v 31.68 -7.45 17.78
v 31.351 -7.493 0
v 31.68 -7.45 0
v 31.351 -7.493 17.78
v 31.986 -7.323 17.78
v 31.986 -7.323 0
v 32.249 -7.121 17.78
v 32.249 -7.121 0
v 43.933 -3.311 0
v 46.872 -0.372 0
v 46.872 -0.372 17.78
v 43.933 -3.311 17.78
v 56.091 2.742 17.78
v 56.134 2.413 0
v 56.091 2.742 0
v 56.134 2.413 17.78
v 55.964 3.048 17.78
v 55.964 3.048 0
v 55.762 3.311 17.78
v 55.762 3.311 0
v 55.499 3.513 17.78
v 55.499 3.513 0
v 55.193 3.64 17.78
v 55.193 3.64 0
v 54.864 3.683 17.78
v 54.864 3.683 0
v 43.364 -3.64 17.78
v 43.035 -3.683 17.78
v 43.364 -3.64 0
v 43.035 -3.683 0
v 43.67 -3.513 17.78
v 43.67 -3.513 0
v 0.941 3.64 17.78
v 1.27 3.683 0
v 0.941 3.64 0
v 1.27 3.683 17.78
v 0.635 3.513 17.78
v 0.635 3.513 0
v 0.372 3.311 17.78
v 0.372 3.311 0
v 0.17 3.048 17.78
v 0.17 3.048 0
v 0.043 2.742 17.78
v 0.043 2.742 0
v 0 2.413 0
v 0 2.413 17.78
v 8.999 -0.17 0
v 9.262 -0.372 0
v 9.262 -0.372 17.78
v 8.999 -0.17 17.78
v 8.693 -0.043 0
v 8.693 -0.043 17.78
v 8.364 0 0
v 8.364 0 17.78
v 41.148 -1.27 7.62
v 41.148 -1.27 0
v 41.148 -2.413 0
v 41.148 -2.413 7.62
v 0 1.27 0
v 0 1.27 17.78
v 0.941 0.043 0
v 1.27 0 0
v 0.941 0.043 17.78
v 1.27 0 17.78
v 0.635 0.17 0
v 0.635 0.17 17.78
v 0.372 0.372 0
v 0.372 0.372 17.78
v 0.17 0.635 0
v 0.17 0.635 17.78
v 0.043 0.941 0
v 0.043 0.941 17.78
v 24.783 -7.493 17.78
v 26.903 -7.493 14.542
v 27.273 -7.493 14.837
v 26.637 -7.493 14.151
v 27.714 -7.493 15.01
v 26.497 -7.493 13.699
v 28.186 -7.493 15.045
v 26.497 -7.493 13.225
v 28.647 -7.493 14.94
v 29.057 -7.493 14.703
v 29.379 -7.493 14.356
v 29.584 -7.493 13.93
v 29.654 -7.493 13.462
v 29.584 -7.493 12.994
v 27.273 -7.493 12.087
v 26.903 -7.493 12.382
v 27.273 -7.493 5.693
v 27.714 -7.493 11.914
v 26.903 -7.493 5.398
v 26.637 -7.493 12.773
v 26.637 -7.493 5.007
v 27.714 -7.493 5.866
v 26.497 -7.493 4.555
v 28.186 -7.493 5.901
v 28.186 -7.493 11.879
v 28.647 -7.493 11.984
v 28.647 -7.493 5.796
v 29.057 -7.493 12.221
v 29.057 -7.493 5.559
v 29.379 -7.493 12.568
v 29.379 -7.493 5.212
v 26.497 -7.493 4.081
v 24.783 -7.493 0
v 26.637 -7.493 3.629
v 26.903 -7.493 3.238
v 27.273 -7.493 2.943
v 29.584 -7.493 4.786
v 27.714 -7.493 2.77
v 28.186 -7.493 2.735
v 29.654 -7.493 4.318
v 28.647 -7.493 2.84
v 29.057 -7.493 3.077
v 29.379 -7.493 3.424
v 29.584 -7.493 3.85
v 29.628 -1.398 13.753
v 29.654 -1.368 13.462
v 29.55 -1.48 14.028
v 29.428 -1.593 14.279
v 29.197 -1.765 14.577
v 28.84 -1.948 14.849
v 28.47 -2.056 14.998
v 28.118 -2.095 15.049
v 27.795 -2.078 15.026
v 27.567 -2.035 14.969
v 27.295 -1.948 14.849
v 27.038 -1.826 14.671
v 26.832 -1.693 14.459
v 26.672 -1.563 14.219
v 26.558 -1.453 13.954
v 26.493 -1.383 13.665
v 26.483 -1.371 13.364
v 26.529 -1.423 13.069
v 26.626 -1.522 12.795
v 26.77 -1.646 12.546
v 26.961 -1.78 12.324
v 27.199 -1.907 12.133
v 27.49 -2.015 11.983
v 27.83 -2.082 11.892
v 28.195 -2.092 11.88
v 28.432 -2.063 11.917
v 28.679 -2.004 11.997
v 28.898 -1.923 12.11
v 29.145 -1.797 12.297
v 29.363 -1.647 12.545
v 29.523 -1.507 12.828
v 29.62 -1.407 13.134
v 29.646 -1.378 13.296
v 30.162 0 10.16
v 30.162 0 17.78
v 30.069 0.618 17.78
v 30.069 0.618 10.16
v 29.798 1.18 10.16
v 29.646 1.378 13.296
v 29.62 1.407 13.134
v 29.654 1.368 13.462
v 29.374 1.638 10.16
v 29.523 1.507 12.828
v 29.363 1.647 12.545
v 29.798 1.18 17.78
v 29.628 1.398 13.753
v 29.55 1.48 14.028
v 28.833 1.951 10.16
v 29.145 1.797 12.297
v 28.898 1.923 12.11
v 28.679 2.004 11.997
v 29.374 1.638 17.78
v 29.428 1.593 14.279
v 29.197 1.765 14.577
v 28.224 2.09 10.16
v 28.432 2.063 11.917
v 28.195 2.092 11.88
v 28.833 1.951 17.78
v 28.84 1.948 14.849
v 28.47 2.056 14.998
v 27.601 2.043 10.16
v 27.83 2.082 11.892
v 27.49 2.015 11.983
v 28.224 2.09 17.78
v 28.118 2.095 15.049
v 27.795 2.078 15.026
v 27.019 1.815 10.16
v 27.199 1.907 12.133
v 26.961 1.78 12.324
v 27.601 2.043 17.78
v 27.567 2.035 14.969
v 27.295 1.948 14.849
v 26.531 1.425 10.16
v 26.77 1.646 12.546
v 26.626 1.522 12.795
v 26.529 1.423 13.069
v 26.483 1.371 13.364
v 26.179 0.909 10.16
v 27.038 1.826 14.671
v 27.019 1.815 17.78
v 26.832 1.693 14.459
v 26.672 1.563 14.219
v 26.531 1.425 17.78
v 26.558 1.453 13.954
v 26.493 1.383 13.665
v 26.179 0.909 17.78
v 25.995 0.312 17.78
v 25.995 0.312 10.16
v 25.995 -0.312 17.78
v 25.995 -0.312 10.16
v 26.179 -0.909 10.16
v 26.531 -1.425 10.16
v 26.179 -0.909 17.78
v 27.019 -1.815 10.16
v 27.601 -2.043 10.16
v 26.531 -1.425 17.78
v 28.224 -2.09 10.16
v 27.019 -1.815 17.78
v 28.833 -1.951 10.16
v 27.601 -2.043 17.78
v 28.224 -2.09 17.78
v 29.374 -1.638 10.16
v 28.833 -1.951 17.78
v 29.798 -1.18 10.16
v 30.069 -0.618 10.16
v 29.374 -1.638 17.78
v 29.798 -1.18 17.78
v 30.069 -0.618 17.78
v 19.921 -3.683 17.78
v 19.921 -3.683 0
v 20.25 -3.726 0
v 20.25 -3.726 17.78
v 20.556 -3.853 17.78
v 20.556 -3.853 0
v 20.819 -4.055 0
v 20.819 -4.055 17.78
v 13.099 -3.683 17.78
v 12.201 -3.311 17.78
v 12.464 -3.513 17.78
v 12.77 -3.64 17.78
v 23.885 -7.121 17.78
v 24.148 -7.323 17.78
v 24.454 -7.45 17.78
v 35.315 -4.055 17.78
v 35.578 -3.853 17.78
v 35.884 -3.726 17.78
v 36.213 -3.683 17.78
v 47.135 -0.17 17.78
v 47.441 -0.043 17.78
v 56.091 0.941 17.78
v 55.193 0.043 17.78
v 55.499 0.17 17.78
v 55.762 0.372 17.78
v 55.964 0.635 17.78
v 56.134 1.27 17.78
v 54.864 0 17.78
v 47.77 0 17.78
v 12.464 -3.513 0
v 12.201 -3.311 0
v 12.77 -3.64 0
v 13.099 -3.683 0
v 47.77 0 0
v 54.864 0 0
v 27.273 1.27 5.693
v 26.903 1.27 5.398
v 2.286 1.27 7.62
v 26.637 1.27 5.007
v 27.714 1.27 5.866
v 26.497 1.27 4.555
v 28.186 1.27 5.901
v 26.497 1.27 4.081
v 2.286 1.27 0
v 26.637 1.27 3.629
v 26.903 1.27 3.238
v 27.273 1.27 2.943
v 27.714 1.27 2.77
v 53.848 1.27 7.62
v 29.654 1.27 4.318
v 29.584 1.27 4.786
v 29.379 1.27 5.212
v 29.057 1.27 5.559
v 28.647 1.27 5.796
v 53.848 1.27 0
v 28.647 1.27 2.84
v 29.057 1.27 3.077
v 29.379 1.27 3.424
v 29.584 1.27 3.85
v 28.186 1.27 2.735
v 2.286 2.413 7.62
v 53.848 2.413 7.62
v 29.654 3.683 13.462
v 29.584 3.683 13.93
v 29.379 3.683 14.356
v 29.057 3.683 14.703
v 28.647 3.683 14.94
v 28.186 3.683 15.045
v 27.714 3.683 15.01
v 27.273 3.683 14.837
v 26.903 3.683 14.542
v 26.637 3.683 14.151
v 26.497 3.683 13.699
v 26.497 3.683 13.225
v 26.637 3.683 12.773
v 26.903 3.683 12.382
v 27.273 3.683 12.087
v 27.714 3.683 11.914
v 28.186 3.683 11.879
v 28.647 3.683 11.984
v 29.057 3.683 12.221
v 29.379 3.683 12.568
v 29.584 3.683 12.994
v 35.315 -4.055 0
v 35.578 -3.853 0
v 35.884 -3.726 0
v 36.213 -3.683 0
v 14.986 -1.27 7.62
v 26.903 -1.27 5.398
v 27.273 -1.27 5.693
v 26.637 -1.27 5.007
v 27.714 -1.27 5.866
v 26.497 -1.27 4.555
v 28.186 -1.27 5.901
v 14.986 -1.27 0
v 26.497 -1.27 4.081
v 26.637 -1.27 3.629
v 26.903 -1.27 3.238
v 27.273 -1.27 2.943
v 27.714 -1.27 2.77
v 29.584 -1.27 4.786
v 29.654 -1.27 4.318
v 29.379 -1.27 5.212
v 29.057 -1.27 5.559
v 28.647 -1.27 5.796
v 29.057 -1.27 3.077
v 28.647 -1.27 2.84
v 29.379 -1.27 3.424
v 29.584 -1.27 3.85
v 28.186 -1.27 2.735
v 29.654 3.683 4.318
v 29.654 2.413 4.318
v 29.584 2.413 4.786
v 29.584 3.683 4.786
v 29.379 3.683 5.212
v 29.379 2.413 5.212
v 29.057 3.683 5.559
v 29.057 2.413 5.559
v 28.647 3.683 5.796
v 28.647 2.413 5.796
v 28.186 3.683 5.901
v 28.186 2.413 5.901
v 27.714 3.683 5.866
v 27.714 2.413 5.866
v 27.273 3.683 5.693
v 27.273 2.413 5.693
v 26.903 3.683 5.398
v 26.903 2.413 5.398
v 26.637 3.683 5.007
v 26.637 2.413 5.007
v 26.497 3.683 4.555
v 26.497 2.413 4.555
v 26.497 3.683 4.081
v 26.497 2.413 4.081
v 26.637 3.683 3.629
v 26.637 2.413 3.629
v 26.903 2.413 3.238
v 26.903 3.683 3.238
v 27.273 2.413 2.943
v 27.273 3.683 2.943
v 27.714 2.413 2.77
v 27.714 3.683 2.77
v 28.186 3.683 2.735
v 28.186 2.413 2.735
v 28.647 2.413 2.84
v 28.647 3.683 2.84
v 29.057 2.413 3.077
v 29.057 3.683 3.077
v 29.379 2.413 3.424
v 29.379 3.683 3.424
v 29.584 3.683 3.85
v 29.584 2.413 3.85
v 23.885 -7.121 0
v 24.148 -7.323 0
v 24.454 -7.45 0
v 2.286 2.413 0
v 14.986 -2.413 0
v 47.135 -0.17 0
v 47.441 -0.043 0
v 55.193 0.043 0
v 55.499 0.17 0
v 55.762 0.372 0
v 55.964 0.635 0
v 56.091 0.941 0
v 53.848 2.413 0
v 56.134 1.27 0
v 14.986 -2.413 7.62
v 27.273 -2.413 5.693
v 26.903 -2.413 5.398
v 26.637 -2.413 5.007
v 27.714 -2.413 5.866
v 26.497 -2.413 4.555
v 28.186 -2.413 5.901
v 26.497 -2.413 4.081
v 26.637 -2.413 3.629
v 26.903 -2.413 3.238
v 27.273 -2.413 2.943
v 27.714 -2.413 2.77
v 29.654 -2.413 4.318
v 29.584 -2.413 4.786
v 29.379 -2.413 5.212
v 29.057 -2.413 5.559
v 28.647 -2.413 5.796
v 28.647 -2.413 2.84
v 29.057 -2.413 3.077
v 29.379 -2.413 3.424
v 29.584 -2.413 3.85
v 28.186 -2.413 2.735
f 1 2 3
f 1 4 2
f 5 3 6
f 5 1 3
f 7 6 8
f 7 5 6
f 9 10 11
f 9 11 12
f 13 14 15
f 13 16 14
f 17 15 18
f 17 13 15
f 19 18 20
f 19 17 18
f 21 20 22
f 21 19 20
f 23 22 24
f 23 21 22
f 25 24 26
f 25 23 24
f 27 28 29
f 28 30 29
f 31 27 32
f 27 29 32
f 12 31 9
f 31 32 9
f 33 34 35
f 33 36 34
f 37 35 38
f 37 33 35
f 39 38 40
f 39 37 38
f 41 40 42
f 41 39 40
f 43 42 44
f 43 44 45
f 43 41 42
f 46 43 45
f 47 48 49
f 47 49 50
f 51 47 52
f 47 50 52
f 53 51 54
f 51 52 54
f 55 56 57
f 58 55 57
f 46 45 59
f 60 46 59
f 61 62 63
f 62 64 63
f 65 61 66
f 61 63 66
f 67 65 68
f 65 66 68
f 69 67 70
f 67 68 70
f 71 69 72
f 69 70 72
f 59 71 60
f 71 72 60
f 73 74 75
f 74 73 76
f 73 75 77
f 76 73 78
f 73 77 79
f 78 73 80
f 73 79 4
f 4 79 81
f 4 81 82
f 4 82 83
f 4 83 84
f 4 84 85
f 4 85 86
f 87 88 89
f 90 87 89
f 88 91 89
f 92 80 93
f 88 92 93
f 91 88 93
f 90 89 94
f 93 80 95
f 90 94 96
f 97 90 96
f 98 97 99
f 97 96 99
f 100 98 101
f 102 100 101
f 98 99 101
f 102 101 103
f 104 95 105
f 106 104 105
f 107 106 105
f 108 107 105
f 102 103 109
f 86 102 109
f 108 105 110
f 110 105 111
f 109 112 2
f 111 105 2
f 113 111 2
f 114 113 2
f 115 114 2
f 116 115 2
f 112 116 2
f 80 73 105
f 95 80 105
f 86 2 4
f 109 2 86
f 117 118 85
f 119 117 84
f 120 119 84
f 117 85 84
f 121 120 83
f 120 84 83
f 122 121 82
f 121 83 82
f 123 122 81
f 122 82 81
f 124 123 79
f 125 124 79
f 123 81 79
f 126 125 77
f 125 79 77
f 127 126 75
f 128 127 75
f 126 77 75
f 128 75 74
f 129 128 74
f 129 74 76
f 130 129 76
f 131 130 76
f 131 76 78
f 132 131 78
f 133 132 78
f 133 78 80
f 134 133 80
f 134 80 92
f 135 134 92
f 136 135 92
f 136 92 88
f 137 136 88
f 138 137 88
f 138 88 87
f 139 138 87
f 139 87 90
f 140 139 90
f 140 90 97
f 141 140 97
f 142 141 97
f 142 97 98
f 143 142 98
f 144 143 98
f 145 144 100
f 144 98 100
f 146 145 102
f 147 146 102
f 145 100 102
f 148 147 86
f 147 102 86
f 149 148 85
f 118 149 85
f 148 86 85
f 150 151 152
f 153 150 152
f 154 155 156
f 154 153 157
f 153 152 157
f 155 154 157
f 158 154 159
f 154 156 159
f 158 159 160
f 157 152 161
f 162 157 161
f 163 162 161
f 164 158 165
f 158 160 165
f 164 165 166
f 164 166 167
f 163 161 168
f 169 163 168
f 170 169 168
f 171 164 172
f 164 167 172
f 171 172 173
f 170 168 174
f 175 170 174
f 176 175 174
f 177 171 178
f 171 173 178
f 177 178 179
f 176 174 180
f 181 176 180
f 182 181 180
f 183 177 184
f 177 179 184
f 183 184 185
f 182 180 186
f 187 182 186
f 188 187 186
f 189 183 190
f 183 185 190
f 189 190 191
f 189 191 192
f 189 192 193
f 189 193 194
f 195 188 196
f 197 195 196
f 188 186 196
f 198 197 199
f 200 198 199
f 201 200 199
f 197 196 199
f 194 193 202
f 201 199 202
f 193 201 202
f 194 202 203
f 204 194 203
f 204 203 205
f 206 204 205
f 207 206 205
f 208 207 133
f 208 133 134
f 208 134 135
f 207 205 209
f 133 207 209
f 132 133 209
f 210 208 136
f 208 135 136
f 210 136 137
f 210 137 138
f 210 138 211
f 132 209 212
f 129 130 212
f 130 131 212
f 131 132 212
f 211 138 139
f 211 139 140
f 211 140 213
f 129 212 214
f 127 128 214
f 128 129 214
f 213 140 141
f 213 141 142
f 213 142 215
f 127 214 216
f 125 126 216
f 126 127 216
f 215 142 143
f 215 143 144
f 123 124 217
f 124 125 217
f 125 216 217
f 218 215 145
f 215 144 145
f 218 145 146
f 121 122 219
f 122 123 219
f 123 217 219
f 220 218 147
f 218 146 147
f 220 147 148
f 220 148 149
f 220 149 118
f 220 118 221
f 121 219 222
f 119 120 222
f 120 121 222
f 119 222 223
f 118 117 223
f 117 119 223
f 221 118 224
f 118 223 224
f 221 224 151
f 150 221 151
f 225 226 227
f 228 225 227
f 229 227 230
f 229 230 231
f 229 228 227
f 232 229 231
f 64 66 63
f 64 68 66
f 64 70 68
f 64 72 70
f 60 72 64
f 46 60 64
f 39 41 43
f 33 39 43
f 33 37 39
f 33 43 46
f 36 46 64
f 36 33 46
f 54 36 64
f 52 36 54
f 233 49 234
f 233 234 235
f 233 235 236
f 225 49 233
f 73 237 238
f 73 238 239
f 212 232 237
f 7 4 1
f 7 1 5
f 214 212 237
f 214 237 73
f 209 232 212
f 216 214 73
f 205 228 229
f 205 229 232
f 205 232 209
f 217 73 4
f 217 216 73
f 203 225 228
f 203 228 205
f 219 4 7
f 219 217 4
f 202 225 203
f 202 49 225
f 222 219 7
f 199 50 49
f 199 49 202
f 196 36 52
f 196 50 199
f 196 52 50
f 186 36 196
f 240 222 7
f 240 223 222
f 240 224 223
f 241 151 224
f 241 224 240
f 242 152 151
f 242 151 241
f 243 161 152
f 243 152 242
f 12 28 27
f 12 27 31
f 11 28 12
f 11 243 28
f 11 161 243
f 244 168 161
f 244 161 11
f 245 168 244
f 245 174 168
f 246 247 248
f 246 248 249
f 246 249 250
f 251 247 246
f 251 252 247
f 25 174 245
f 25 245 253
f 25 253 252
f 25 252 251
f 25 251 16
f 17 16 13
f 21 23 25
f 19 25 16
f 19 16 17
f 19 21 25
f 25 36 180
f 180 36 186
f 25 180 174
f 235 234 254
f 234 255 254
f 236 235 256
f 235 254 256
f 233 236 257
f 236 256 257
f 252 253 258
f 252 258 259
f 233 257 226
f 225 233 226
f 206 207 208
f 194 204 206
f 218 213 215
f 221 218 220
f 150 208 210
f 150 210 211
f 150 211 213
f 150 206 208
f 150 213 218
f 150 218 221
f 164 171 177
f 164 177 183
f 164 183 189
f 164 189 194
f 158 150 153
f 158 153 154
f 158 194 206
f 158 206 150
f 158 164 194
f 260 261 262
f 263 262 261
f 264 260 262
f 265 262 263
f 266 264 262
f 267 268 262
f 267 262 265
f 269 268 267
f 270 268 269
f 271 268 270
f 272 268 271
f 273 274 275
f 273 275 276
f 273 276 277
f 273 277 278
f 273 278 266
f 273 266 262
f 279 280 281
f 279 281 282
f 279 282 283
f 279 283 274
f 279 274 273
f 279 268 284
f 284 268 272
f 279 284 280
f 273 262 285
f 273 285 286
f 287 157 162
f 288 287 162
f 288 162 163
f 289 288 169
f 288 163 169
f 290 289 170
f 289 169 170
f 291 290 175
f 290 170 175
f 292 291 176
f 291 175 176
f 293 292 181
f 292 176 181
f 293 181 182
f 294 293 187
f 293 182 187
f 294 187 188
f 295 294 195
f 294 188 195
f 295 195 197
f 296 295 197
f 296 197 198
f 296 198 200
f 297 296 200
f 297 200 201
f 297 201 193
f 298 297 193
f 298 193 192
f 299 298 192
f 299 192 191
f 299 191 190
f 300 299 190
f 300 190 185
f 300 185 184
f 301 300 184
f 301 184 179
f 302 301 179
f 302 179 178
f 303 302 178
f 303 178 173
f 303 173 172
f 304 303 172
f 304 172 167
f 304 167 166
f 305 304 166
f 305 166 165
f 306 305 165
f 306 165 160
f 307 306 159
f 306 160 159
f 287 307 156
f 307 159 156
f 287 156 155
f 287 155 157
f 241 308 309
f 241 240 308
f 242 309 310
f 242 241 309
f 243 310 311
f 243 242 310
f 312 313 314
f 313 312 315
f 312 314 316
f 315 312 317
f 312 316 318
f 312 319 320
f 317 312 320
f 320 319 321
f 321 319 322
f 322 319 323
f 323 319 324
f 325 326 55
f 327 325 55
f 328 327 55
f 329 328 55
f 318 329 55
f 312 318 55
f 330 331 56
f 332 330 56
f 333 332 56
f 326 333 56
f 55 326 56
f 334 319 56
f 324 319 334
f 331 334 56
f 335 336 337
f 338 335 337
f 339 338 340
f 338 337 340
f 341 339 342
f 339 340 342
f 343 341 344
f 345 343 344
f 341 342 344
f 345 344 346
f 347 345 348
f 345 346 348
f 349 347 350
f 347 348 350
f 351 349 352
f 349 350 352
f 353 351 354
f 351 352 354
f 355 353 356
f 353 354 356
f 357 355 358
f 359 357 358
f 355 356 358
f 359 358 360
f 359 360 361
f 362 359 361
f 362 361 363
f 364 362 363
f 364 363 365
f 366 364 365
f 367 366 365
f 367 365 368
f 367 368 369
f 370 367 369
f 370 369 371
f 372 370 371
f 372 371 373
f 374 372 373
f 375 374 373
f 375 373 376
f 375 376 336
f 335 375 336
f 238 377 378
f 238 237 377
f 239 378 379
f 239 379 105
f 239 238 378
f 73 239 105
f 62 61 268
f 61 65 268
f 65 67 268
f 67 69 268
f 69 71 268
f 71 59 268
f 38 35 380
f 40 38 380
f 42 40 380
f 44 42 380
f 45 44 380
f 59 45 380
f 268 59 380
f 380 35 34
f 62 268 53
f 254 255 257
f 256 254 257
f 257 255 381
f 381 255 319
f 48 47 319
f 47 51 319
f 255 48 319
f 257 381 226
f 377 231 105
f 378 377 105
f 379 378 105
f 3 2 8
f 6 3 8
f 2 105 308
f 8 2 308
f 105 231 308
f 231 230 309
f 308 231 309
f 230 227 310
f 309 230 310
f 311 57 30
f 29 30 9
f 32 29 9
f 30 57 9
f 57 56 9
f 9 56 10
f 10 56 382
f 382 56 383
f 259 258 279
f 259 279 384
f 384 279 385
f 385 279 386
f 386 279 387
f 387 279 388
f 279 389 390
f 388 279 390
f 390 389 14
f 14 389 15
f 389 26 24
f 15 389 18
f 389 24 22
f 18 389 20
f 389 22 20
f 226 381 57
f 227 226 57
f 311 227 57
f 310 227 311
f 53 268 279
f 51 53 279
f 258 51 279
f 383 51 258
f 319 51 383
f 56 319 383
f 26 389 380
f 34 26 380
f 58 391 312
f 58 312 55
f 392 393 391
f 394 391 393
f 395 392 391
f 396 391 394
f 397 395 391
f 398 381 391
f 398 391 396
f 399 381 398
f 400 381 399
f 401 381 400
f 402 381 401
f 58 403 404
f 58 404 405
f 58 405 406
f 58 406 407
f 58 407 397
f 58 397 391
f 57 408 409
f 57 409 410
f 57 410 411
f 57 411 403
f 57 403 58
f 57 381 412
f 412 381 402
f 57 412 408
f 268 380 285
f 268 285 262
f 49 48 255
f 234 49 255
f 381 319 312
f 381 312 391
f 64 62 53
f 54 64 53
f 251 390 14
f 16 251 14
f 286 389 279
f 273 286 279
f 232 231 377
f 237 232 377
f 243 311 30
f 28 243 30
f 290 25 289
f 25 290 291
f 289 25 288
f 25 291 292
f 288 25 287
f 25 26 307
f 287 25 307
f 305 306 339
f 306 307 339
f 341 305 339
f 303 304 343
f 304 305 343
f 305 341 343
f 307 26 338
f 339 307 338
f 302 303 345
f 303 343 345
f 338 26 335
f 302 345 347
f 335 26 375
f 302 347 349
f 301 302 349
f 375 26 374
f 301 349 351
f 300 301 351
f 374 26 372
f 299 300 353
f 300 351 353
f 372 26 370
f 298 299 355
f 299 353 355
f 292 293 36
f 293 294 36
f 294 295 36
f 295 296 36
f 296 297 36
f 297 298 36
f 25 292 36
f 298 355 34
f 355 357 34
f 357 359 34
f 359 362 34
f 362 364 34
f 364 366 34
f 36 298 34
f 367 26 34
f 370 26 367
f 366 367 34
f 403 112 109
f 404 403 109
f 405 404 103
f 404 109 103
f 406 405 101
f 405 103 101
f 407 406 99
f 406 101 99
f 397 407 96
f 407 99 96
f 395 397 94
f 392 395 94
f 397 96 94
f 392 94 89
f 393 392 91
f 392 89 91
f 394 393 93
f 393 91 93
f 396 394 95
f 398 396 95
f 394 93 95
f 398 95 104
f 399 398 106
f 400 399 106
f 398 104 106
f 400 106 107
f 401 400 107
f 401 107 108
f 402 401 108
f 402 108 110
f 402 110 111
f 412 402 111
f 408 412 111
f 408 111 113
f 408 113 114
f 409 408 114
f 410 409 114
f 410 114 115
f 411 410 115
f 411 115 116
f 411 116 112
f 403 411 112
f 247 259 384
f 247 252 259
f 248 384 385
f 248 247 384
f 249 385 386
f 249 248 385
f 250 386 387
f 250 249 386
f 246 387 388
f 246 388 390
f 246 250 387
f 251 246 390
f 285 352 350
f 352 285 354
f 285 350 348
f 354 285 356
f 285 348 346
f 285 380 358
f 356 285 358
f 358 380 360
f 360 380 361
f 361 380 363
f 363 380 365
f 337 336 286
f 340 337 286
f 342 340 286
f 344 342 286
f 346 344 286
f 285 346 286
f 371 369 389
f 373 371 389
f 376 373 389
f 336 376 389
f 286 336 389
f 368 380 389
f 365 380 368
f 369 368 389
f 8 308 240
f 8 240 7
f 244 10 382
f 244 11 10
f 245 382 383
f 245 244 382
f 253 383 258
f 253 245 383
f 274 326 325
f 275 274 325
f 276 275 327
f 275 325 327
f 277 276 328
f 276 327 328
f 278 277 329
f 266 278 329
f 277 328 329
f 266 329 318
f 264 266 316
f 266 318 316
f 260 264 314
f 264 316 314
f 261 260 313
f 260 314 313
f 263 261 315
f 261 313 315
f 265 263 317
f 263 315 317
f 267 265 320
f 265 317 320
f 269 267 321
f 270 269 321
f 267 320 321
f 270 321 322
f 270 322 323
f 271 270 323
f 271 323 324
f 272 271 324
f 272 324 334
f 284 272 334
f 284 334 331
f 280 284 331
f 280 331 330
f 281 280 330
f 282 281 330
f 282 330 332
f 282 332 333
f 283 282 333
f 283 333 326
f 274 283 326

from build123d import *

# Parameters (mm, degrees)
F0_W         = 7.62
F0_H         = 3.81
F1_DEPTH     = 17.78
F2_W         = 51.562
F2_H         = 1.143
F2_W_2       = 26.162
F3_DEPTH     = 7.62
F4_T4_DEPTH  = 17.78
F4_T9_DEPTH  = 17.78
F4_T14_DEPTH = 17.78
F4_T19_DEPTH = 17.78
F5_R         = 1.5875
F6_DEPTH     = 25.4
F7_R         = 2.0955
F8_DEPTH     = 7.62
F9_R         = 1.27


# Not quite as in the source:
# - a fillet or chamfer that OpenCascade refuses, or shapes differently, is made with other operations: its cross-section is extruded or revolved along the edge and cut away or added


with BuildPart() as f1:
    # F0 (on Top) → F1 (new body)
    with BuildSketch(Plane.XY):
        Polygon((0, 3.683), (0, 0), (12.7, 0), (43.434, 0), (56.134, 0), (56.134, 3.683), align=None)
        Polygon((43.434, 0), (12.7, 0), (12.7, -3.683), (24.257, -3.683), (31.877, -3.683), (43.434, -3.683), align=None)
        with Locations((28.067, -5.588)):
            Rectangle(F0_W, F0_H)
    extrude(amount=F1_DEPTH)

    # F2 (on face) → F3 (cut)
    with BuildSketch(Plane(origin=(0, 0, 0), x_dir=(1, 0, 0), z_dir=(0, 0, -1))):
        with Locations((28.067, -1.8415)):
            Rectangle(F2_W, F2_H)
        with Locations((28.067, 1.8415)):
            Rectangle(F2_W_2, F2_H)
    extrude(amount=-F3_DEPTH, mode=Mode.SUBTRACT)

    # F4: chamfer of 3.81 on 4 edges, made by hand


with BuildPart() as f4_tool2:
    # F4_s3 → F4_t4 (new body)
    with BuildSketch(Plane.XY):
        Polygon((35.687, -3.683), (31.877, -7.493), (31.877, -3.683), align=None)
    extrude(amount=F4_T4_DEPTH)

    split(bisect_by=Plane.XZ.offset(7.493), keep=Keep.BOTTOM)


with BuildPart() as f1_1:
    add(f1.part)

    # F4_t1: union F4_tool2
    add(f4_tool2.part)


with BuildPart() as f4_tool7:
    # F4_s8 → F4_t9 (new body)
    with BuildSketch(Plane.XY):
        Polygon((47.244, 0), (43.434, -3.81), (43.434, 0), align=None)
    extrude(amount=F4_T9_DEPTH)

    split(bisect_by=Plane.XZ.offset(3.683), keep=Keep.BOTTOM)


with BuildPart() as f1_2:
    add(f1_1.part)

    # F4_t6: union F4_tool7
    add(f4_tool7.part)


with BuildPart() as f4_tool12:
    # F4_s13 → F4_t14 (new body)
    with BuildSketch(Plane.XY):
        Polygon((20.447, -3.683), (24.257, -7.493), (24.257, -3.683), align=None)
    extrude(amount=F4_T14_DEPTH)

    split(bisect_by=Plane.XZ.offset(7.493), keep=Keep.BOTTOM)


with BuildPart() as f1_3:
    add(f1_2.part)

    # F4_t11: union F4_tool12
    add(f4_tool12.part)


with BuildPart() as f4_tool17:
    # F4_s18 → F4_t19 (new body)
    with BuildSketch(Plane.XY):
        Polygon((8.89, 0), (12.7, -3.81), (12.7, 0), align=None)
    extrude(amount=F4_T19_DEPTH)

    split(bisect_by=Plane.XZ.offset(3.683), keep=Keep.BOTTOM)


with BuildPart() as f1_4:
    add(f1_3.part)

    # F4_t16: union F4_tool17
    add(f4_tool17.part)

    # F5 (on face) → F6 (cut)
    with BuildSketch(Plane.XZ.offset(7.493)):
        with Locations((28.067, 13.462)):
            Circle(F5_R)
        with Locations((28.067, 4.318)):
            Circle(F5_R)
    extrude(amount=-F6_DEPTH, mode=Mode.SUBTRACT)

    # F7 (on face) → F8 (cut)
    with BuildSketch(Plane.XY.offset(17.78)):
        with Locations((28.067, 0)):
            Circle(F7_R)
    extrude(amount=-F8_DEPTH, mode=Mode.SUBTRACT)

    # F9
    f9_edges = [f1_4.edges().sort_by_distance(p)[0] for p in [
        (0, 0, 8.89),
        (56.134, 0, 8.89),
        (56.134, 3.683, 8.89),
        (0, 3.683, 8.89),
        (12.573, -3.683, 8.89),
        (43.561, -3.683, 8.89),
        (31.877, -7.493, 8.89),
        (24.257, -7.493, 8.89),
        (8.89, 0, 8.89),
        (47.244, 0, 8.89),
        (35.687, -3.683, 8.89),
        (20.447, -3.683, 8.89),
    ]]
    fillet(f9_edges, radius=F9_R)


solid = f1_4.part
